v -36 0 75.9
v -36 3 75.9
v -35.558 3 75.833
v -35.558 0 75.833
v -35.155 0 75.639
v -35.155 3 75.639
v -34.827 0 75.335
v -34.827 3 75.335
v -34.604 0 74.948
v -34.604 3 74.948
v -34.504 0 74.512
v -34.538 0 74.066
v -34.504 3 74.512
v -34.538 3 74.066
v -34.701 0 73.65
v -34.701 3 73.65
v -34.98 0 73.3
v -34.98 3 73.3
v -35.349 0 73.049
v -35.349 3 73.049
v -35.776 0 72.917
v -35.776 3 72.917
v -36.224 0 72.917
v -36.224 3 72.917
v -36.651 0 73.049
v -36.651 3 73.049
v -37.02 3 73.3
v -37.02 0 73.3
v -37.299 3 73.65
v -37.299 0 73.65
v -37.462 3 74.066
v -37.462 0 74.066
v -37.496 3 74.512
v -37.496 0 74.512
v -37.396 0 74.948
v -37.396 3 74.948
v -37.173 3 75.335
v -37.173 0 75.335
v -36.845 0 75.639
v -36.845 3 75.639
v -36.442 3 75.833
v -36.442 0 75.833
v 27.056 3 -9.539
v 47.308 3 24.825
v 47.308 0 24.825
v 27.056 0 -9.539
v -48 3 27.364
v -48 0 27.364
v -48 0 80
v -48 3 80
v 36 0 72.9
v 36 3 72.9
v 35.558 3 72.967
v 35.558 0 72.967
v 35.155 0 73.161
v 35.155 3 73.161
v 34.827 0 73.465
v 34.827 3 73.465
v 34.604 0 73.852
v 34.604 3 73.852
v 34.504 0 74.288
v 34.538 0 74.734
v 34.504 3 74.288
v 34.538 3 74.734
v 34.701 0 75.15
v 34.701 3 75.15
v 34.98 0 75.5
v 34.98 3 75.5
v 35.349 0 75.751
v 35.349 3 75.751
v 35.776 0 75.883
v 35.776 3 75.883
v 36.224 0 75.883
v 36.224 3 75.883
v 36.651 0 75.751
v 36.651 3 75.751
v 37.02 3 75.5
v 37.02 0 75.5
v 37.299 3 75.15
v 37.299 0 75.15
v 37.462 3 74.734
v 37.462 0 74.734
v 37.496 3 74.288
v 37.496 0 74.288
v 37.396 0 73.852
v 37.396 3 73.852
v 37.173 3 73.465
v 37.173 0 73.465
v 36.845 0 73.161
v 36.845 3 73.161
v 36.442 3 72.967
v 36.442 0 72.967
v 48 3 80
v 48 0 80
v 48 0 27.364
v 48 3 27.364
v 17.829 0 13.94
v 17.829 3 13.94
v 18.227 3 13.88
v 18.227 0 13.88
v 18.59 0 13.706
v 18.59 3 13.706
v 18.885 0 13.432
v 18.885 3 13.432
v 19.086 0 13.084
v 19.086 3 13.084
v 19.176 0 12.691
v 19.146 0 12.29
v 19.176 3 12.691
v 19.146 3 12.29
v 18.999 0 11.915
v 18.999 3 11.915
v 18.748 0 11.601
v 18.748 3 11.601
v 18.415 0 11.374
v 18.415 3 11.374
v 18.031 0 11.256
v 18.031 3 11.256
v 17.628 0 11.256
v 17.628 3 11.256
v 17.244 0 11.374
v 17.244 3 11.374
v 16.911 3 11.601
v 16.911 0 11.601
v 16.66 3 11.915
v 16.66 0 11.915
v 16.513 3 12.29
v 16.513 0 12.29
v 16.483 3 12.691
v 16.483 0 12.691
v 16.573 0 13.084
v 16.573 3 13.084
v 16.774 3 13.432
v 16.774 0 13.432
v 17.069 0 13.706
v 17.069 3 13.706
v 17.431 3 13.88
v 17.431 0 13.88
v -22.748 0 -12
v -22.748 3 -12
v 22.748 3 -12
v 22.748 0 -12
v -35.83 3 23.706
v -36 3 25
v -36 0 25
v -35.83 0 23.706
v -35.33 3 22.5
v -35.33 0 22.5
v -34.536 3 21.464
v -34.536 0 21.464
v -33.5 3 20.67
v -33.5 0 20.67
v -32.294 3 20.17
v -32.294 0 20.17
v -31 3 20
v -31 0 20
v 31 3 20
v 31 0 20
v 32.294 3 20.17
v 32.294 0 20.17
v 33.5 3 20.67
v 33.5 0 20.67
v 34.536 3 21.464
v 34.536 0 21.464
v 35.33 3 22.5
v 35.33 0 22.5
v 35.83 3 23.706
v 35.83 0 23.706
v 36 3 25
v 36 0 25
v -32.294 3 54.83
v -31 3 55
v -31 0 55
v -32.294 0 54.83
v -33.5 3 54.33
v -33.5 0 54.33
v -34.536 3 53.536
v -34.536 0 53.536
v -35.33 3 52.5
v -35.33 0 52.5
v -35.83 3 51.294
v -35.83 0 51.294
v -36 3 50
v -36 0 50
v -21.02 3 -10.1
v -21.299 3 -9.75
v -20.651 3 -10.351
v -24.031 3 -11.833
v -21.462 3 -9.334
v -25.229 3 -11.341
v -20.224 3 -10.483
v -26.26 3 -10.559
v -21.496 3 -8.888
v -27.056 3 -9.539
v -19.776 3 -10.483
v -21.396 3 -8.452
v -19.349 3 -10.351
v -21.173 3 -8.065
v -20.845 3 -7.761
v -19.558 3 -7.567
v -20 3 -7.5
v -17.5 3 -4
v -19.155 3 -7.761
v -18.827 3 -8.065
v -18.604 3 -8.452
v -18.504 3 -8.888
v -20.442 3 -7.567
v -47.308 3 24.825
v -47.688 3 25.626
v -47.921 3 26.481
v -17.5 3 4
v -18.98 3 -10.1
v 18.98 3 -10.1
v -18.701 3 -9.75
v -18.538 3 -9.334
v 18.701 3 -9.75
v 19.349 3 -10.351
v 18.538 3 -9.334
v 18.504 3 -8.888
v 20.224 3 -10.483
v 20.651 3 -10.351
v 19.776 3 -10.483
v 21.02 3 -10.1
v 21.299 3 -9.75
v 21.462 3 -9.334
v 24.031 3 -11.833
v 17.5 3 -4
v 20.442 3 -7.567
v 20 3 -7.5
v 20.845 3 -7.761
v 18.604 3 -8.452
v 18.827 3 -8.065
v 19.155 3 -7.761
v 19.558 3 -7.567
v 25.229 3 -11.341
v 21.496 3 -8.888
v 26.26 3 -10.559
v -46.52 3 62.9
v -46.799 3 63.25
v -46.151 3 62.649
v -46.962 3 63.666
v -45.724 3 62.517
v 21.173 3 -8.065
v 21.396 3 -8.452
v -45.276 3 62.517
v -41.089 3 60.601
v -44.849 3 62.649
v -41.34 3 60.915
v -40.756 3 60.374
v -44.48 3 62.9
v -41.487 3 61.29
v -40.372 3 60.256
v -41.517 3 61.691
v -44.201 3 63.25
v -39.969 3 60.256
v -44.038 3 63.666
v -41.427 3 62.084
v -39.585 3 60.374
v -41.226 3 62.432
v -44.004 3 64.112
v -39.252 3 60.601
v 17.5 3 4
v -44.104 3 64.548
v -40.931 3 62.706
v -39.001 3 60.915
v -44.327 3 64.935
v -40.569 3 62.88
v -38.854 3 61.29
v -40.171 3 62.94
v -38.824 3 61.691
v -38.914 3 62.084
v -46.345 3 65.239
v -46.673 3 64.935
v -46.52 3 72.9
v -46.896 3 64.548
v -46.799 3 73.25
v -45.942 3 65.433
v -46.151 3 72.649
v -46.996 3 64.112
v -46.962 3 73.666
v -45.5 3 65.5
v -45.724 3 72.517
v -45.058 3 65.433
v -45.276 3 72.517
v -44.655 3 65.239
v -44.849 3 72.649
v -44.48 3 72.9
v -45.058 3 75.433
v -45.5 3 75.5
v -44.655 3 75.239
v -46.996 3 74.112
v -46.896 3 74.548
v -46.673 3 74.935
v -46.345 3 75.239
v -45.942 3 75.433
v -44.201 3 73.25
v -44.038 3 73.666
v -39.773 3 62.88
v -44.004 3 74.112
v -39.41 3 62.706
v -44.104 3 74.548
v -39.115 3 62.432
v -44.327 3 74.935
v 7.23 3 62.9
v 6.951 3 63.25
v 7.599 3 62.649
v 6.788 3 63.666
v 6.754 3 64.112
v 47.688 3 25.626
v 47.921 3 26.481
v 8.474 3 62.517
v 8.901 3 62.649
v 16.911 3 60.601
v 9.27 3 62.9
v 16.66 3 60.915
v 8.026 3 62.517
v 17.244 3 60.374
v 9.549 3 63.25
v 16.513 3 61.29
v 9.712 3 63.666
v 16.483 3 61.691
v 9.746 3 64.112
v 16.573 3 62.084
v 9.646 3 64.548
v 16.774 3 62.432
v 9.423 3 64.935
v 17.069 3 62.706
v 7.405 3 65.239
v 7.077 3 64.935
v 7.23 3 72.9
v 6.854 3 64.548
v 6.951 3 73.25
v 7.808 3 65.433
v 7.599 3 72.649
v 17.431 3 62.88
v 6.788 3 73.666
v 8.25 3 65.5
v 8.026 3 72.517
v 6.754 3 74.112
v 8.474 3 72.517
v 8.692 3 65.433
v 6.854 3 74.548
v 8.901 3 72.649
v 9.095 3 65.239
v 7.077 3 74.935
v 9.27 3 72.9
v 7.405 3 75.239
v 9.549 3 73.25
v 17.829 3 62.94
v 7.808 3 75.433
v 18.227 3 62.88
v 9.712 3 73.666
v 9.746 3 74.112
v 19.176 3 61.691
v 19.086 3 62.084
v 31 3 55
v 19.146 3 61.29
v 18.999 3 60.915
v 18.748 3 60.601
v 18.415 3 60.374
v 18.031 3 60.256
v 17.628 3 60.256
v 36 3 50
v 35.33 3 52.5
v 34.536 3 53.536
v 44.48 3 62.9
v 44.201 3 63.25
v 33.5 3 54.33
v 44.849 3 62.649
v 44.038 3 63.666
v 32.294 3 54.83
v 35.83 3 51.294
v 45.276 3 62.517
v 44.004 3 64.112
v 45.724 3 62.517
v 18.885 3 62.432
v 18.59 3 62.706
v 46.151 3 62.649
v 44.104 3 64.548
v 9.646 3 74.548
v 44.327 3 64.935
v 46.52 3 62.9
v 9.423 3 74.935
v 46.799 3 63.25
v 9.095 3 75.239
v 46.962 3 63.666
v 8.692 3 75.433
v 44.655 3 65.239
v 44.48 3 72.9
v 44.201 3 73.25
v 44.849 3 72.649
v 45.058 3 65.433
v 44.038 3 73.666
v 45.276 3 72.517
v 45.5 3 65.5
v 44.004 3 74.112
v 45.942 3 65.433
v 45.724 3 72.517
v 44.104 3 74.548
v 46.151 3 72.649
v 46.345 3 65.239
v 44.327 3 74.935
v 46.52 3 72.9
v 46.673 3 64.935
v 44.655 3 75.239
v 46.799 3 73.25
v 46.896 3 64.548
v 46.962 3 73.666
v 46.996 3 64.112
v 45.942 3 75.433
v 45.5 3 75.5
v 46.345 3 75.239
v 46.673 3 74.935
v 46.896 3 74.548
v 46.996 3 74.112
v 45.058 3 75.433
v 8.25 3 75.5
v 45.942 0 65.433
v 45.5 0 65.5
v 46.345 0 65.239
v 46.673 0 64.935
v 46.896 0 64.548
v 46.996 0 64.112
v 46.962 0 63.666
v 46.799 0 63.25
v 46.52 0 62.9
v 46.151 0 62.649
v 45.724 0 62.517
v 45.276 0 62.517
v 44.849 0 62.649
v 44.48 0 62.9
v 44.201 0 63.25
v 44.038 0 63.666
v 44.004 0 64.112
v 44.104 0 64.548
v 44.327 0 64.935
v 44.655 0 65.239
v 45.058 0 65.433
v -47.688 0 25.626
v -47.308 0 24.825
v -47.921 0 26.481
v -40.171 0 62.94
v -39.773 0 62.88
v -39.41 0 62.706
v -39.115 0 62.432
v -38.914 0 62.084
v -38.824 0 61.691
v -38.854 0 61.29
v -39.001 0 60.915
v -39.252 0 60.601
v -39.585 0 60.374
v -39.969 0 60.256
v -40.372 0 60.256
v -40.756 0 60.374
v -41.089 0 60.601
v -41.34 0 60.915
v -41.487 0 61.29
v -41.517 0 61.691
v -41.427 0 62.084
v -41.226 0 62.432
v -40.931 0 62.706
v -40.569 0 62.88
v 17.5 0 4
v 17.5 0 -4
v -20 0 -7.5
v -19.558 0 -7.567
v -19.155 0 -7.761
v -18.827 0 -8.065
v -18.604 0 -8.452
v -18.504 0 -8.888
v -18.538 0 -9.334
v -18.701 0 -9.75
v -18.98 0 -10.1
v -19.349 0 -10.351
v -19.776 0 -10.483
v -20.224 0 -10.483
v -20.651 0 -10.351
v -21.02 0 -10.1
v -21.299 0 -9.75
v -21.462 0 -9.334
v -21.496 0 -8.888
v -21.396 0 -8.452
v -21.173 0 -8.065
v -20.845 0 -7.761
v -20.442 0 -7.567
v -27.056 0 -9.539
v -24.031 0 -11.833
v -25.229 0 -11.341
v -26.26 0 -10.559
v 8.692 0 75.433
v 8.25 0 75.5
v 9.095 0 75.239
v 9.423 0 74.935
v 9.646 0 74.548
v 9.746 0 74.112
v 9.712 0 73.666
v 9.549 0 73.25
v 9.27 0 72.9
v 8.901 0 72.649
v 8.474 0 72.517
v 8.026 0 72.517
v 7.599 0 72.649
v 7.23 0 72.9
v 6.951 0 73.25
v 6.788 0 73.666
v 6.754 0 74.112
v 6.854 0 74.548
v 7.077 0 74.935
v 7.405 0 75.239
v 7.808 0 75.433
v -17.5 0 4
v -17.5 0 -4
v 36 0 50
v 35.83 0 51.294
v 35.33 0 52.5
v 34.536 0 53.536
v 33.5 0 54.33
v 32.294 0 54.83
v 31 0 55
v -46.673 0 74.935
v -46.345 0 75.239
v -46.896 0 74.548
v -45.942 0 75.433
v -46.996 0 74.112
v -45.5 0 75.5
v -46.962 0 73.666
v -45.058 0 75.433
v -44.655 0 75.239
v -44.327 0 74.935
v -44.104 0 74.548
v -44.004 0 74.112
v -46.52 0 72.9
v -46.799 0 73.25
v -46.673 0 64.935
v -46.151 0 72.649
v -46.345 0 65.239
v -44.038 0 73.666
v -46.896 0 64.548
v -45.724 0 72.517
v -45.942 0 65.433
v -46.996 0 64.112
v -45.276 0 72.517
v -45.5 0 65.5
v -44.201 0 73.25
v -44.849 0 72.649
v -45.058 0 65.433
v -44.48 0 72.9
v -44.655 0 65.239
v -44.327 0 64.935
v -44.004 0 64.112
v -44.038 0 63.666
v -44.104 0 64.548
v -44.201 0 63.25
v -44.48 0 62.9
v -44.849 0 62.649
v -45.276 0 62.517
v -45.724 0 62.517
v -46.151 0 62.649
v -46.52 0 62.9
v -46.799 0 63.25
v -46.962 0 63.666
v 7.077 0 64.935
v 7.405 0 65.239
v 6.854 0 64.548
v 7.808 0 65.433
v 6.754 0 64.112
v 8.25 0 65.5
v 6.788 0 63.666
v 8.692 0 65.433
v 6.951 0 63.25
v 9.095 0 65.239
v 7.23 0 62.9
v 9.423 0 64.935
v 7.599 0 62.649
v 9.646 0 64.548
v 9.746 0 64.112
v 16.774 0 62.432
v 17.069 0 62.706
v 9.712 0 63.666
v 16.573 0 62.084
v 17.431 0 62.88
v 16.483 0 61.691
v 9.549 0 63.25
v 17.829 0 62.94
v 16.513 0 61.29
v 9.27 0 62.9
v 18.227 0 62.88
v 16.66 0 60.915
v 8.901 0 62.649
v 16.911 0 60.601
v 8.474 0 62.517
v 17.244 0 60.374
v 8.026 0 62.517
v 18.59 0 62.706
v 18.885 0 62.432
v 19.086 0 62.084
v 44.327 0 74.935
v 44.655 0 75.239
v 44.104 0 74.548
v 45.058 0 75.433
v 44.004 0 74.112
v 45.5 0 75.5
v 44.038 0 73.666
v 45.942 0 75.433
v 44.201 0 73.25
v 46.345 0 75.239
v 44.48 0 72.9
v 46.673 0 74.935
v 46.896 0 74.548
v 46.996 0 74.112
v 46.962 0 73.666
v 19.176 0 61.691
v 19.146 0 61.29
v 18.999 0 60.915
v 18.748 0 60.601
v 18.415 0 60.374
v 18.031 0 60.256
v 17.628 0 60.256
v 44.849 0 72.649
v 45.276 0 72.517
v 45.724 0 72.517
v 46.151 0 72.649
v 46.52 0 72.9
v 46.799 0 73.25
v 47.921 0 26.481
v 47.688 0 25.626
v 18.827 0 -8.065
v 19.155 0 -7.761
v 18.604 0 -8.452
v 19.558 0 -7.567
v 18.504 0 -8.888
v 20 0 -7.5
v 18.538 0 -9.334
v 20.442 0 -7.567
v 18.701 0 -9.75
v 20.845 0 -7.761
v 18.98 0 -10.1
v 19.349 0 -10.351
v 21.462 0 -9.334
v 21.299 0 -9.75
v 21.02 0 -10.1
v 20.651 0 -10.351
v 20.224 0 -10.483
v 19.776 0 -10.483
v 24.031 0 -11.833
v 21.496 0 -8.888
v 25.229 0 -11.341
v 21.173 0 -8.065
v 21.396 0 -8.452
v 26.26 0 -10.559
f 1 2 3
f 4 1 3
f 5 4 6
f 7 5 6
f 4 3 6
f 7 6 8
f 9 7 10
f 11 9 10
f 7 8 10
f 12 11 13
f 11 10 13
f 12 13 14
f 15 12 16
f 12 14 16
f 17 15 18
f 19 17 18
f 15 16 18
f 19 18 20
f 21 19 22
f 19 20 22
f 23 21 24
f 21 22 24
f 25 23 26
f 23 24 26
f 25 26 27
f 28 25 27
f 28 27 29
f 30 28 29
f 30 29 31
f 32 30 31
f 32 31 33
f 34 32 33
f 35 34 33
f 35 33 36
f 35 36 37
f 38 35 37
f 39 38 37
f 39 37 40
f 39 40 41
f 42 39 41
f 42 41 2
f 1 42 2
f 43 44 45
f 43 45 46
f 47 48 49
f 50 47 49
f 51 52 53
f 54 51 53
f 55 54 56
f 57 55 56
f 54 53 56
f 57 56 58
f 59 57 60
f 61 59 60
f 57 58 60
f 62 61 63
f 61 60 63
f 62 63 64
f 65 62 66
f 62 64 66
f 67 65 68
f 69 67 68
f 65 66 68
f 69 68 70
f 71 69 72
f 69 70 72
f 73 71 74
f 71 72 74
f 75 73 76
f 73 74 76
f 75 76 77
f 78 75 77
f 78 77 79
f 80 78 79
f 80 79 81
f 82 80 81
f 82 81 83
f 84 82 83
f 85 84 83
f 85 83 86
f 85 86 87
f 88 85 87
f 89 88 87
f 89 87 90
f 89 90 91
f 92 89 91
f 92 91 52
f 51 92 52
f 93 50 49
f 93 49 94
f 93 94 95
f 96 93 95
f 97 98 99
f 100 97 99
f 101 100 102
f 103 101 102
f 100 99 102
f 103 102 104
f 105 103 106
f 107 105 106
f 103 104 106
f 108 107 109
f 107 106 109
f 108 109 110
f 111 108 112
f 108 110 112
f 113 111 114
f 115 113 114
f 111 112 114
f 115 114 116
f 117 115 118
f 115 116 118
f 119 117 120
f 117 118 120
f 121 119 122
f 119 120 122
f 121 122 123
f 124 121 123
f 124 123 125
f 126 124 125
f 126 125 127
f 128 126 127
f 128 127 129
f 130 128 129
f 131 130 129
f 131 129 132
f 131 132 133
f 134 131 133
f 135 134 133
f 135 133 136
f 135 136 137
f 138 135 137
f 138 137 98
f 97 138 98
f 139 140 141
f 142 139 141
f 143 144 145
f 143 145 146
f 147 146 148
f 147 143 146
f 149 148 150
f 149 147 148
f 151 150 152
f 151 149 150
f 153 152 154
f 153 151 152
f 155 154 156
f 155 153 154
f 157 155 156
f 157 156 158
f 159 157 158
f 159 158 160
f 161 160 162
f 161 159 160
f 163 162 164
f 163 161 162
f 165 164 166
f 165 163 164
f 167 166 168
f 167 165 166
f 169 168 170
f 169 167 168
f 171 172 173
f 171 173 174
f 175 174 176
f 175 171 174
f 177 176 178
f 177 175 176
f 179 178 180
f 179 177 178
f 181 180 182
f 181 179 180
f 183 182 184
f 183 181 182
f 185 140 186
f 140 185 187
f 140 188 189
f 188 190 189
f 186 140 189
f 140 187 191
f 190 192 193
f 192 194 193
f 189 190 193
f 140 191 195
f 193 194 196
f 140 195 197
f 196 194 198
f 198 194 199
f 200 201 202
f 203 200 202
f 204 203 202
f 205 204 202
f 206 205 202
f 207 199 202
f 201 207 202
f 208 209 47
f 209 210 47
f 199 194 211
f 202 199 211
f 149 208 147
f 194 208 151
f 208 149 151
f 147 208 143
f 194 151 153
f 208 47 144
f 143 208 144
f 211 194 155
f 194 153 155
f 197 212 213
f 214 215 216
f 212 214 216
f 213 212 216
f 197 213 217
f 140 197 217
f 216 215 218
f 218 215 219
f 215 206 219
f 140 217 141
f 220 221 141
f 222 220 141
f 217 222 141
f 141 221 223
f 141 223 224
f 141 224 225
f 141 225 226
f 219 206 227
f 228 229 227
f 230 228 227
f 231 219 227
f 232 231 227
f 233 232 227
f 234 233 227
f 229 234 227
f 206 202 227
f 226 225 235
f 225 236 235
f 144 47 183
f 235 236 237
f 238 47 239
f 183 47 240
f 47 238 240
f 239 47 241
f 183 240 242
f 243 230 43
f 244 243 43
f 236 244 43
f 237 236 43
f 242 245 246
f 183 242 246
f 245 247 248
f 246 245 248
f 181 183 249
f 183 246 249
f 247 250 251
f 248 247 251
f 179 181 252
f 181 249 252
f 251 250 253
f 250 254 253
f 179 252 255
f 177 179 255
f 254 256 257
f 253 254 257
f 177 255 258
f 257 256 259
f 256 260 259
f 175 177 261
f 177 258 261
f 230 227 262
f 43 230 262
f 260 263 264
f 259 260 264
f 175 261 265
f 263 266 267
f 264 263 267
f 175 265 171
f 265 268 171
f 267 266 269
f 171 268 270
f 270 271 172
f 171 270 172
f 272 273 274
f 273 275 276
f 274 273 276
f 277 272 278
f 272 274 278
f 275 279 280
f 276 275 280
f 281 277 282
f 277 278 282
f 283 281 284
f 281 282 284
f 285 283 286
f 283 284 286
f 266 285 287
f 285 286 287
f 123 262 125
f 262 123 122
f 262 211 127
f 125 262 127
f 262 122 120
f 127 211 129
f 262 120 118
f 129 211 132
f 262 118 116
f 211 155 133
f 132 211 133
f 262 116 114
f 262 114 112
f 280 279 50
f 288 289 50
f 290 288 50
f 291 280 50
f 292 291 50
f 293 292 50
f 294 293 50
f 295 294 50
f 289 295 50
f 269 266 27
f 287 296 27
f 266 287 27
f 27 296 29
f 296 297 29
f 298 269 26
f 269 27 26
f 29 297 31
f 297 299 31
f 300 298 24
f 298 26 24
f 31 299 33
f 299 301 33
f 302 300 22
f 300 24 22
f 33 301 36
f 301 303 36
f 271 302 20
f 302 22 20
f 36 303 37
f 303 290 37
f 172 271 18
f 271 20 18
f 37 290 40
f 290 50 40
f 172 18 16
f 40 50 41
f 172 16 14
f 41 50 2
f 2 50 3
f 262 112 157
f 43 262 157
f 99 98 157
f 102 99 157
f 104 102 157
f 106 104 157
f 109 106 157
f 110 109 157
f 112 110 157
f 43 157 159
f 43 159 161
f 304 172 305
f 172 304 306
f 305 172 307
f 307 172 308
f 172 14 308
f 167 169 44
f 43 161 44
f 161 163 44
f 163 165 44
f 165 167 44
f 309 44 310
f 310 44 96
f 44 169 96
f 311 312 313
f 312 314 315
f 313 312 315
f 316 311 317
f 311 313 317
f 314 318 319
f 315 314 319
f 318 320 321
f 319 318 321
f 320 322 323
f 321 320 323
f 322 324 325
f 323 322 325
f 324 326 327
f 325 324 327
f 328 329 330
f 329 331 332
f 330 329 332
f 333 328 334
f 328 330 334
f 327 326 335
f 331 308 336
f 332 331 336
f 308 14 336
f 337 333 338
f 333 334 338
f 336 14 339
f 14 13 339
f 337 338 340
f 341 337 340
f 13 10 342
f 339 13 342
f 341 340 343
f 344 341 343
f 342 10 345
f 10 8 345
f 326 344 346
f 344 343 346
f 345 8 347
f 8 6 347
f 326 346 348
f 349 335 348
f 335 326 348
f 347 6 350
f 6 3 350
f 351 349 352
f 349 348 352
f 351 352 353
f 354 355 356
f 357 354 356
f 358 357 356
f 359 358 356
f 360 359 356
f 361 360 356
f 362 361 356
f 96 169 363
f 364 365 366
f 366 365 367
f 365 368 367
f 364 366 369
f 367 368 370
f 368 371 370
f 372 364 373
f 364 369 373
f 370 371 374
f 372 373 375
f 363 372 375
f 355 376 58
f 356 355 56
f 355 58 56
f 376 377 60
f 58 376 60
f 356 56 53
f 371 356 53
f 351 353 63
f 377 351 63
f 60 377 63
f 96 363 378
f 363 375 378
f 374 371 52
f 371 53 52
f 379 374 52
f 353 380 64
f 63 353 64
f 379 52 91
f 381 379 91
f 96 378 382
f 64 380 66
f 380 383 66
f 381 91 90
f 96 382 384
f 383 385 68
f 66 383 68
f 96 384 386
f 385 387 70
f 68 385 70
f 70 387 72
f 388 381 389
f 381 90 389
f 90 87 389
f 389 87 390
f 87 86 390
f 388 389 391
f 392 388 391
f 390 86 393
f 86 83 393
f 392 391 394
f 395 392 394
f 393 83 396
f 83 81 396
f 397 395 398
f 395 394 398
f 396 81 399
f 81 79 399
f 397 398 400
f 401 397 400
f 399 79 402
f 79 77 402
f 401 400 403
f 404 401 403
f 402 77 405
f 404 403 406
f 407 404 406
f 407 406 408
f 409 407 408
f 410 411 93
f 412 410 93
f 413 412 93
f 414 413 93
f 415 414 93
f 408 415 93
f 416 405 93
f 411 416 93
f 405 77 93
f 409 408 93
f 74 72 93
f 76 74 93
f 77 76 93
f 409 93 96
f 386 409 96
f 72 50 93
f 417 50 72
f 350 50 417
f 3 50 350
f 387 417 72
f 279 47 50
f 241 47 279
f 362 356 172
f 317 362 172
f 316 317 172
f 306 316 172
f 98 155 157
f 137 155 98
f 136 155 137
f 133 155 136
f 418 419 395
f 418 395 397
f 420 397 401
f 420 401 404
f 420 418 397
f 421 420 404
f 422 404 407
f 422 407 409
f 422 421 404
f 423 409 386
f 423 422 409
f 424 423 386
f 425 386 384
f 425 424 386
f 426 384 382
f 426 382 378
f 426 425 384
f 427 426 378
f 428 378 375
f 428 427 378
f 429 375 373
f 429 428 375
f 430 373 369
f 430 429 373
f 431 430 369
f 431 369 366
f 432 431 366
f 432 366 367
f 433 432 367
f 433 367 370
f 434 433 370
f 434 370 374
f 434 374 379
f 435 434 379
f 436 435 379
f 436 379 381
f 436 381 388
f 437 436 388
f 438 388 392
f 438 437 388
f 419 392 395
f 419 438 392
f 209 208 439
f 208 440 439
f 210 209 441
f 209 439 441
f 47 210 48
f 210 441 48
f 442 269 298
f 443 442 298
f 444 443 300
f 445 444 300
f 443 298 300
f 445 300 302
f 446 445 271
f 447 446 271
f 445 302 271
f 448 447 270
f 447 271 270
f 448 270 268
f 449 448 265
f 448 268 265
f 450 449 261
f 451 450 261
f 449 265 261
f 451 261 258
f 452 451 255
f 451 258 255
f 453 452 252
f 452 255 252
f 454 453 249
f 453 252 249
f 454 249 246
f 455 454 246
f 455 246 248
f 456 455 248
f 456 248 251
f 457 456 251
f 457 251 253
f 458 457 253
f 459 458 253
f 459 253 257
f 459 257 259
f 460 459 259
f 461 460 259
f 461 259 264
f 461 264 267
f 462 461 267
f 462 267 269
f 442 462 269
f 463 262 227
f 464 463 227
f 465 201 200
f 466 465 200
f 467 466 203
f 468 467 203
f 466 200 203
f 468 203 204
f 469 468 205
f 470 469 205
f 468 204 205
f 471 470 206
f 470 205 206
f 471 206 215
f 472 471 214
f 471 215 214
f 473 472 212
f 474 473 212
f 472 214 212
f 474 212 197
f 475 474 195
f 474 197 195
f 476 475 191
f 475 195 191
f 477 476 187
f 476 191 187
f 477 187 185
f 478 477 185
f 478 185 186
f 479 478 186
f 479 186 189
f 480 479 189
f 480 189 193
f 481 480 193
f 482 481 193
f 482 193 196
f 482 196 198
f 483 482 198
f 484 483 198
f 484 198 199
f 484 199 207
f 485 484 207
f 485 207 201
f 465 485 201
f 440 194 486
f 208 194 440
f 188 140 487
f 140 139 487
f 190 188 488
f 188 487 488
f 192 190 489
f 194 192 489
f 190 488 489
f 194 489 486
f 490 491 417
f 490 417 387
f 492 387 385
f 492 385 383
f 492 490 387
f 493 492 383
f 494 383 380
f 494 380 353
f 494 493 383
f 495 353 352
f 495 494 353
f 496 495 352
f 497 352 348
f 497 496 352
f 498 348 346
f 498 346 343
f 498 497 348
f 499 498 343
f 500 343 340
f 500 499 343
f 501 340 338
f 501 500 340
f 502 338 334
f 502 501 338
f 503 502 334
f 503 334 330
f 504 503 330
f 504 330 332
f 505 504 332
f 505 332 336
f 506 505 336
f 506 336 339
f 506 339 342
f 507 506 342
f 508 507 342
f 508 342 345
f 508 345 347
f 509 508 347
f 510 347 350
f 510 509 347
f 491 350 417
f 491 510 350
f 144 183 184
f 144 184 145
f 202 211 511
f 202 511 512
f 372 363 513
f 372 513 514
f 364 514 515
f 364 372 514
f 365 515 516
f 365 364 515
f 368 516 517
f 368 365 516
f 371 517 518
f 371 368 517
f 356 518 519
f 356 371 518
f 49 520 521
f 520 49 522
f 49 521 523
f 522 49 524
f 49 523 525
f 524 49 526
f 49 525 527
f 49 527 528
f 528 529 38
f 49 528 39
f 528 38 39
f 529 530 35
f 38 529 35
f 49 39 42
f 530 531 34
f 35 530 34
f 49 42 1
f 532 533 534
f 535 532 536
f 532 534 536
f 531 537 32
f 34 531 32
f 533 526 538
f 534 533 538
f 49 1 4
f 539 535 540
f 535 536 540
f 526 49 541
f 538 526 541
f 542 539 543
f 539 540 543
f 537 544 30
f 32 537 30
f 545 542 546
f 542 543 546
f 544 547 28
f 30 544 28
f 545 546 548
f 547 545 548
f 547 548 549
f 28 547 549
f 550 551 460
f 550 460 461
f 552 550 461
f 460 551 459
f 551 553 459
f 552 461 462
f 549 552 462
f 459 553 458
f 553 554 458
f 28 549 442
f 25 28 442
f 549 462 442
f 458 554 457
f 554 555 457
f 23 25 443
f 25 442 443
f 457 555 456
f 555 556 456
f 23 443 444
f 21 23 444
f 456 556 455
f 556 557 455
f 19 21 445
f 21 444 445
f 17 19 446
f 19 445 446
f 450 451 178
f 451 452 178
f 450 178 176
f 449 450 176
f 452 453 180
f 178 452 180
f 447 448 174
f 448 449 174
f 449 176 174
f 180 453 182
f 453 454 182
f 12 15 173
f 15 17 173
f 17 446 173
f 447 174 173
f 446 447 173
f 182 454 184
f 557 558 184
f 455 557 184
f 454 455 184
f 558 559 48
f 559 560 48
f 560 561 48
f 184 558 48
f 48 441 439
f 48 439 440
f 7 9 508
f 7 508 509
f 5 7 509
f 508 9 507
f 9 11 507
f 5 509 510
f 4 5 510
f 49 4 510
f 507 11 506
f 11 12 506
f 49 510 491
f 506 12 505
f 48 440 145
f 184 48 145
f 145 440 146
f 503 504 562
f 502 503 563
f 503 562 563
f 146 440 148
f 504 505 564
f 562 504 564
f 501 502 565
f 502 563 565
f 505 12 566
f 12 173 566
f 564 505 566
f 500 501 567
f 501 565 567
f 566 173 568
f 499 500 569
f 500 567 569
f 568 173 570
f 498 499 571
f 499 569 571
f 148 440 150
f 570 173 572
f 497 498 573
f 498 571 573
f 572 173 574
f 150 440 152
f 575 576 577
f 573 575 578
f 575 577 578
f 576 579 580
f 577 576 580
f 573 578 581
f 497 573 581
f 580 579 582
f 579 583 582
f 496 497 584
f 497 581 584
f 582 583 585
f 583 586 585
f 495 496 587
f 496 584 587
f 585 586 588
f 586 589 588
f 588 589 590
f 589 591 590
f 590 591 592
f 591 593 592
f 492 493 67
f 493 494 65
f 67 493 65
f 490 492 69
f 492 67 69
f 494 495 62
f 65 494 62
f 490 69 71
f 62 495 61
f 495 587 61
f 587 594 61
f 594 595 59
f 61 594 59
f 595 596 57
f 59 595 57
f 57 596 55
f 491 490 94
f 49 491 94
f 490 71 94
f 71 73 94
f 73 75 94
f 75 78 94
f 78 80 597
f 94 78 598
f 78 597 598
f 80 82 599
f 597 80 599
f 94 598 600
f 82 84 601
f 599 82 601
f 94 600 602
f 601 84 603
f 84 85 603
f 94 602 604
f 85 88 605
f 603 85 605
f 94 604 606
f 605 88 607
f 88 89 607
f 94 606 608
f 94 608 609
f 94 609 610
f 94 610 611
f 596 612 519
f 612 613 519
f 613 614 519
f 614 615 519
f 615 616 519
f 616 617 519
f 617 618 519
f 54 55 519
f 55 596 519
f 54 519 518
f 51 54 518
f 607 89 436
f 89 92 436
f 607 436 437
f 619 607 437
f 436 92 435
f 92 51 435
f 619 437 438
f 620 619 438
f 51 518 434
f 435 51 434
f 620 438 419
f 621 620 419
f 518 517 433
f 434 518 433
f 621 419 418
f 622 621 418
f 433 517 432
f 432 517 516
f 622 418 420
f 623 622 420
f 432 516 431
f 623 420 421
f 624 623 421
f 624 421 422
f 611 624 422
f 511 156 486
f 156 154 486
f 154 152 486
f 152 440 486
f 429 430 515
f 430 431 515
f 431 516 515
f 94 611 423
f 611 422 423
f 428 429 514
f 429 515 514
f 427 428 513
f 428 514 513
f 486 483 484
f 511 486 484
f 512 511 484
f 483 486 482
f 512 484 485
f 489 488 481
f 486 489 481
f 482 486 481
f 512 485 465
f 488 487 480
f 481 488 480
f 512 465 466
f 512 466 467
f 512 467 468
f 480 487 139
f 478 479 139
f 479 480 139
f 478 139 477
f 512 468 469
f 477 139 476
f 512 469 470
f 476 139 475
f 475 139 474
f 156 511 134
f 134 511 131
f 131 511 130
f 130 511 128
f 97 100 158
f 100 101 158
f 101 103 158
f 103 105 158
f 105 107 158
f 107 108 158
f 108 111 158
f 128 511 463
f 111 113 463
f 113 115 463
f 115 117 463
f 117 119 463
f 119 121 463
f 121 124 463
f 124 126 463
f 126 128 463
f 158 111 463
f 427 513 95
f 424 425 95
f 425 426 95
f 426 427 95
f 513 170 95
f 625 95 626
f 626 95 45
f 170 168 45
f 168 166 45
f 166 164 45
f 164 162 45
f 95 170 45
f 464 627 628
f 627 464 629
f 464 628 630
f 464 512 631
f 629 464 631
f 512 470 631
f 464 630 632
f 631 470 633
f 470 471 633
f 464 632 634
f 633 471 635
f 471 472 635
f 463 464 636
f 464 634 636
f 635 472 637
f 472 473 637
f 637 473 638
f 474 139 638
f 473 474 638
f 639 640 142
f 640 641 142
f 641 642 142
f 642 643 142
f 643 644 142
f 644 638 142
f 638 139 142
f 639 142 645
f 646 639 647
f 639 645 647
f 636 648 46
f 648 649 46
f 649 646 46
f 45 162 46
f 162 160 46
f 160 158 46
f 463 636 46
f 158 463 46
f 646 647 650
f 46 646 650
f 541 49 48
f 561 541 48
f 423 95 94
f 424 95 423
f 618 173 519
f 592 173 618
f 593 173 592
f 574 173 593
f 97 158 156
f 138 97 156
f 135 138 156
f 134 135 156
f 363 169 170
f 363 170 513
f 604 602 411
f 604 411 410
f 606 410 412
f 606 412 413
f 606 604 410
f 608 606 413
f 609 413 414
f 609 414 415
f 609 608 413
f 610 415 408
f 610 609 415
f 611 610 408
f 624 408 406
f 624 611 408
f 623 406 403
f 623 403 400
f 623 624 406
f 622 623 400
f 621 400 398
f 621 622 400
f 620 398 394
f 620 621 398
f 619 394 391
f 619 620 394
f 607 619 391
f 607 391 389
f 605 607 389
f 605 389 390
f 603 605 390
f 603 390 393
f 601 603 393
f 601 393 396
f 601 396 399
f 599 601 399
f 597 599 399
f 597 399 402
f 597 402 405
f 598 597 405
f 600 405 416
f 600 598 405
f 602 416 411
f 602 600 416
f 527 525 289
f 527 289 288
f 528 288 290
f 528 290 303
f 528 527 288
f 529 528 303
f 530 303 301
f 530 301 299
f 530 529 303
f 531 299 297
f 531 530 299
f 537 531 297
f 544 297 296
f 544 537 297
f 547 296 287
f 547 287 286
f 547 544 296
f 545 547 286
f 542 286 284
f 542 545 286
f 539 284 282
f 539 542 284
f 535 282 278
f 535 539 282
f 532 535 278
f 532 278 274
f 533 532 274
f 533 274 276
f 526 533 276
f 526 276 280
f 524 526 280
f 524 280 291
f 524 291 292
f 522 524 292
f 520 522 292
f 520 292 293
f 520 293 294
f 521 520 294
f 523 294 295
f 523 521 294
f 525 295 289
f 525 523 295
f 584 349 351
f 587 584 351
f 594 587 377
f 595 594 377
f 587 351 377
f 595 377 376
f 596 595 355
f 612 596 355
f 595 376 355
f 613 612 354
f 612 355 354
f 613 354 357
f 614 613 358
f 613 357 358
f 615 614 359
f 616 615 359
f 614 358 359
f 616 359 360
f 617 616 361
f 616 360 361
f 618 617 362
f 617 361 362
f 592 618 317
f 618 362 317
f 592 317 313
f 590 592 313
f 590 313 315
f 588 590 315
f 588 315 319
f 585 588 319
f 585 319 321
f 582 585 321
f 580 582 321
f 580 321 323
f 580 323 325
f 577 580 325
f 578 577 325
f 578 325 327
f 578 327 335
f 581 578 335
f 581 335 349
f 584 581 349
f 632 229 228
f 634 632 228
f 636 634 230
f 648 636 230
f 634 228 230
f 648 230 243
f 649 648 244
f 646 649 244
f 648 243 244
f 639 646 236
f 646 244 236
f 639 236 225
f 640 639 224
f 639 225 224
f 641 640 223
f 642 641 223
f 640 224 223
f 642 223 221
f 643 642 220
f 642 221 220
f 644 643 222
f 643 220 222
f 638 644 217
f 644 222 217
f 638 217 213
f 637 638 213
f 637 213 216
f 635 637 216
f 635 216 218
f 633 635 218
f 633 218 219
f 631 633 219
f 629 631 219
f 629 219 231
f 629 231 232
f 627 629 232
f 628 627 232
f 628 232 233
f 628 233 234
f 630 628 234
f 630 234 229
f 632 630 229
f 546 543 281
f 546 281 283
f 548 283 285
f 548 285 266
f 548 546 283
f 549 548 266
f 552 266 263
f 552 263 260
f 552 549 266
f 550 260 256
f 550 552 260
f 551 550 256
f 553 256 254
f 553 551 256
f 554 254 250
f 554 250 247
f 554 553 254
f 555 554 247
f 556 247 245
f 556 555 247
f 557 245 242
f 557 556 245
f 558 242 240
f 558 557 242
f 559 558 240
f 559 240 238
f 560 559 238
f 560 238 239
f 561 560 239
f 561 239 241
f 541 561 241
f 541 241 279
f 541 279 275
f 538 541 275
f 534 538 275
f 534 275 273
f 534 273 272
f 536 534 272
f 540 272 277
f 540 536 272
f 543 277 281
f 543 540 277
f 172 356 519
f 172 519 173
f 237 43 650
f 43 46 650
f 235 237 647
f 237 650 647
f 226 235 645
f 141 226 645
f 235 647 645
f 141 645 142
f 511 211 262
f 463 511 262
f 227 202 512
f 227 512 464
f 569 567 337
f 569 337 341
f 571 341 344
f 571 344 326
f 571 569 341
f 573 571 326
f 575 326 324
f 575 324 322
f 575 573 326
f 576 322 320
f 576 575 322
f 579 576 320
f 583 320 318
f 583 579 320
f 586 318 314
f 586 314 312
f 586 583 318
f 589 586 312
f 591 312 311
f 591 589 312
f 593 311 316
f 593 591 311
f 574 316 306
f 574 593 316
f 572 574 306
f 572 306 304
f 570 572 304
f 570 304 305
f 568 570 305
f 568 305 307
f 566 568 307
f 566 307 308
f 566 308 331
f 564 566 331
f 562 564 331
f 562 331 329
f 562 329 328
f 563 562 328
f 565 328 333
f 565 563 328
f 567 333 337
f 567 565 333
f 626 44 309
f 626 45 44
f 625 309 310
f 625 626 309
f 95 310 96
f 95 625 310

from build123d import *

# Parameters (mm, degrees)
SKETCH1_R           = 1.5
SKETCH1_R_2         = 1.65
SKETCH1_W           = 6
SKETCH1_H           = 28
BOSS_EXTRUDE1_DEPTH = 3
CUT_EXTRUDE2_REACH  = 109.373
SKETCH3_R           = 1.5
CUT_EXTRUDE3_REACH  = 109.373
SKETCH4_W           = 22.395
SKETCH4_H           = 68
SKETCH6_W           = 51.21
SKETCH6_H           = 5
BOSS_EXTRUDE2_DEPTH = 3
CUT_EXTRUDE4_REACH  = 109.373
SKETCH7_R           = 1.5
CUT_EXTRUDE5_REACH  = 109.373
SKETCH9_R           = 1.5
CUT_EXTRUDE6_REACH  = 109.373
SKETCH11_R          = 1.5
SKETCH11_R_2        = 2.5
BOSS_EXTRUDE3_DEPTH = 3
CUT_EXTRUDE7_REACH  = 109.373
CUT_EXTRUDE8_START  = -3
SKETCH13_W          = 4.95
SKETCH13_H          = 15
SKETCH13_W_2        = 6.078763038
SKETCH13_H_2        = 4.767996375
CUT_EXTRUDE8_DEPTH  = 3
BOSS_EXTRUDE4_DEPTH = 3
CUT_EXTRUDE9_REACH  = 120.849
SKETCH15_R          = 1.5
CUT_EXTRUDE10_DEPTH = 119.84864324
SKETCH19_W          = 9
SKETCH19_H          = 48.6
SKETCH19_W_2        = 31.468413904
SKETCH19_H_2        = 28.051944454
BOSS_EXTRUDE5_DEPTH = 3
SKETCH20_W          = 96
SKETCH20_H          = 16
CUT_EXTRUDE11_DEPTH = 108.373181009
SKETCH22_W          = 4.143615352
SKETCH22_H          = 3.607002568
BOSS_EXTRUDE6_DEPTH = 3
FILLET1_R           = 5
SKETCH23_R          = 1.35
CUT_EXTRUDE12_DEPTH = 94.343451832
CUT_EXTRUDE13_DEPTH = 94.343451832
SKETCH28_W          = 35
SKETCH28_H          = 8
CUT_EXTRUDE17_DEPTH = 94.343451832
SKETCH29_R          = 1.5
CUT_EXTRUDE18_DEPTH = 94.343451832


with BuildPart() as part:
    # Sketch1 → Boss-Extrude1 (new body)
    with BuildSketch(Plane(origin=(0, 0, 0), x_dir=(1, 0, 0), z_dir=(0, 1, 0))):
        Polygon((-48, -80), (-48, 80), (48, 80), (48, -80), (48, -96), (-48, -96), align=None)
        with Locations(Location((45.5, -74, 0), (0, 0, 270))):
            Circle(SKETCH1_R, mode=Mode.SUBTRACT)
        with Locations(Location((45.5, -64, 0), (0, 0, 270))):
            Circle(SKETCH1_R, mode=Mode.SUBTRACT)
        with Locations(Location((-45.5, -64, 0), (0, 0, 270))):
            Circle(SKETCH1_R, mode=Mode.SUBTRACT)
        with Locations(Location((-45.5, -74, 0), (0, 0, 270))):
            Circle(SKETCH1_R, mode=Mode.SUBTRACT)
        with Locations(Location((8.25, -74, 0), (0, 0, 270))):
            Circle(SKETCH1_R, mode=Mode.SUBTRACT)
        with Locations(Location((8.25, -64, 0), (0, 0, 270))):
            Circle(SKETCH1_R, mode=Mode.SUBTRACT)
        with Locations(Location((0.259511597, -37.46931278, 0), (0, 0, 270))):
            Circle(SKETCH1_R_2, mode=Mode.SUBTRACT)
        with Locations(Location((15.320886036, -37.46931278, 0), (0, 0, 270))):
            Circle(SKETCH1_R_2, mode=Mode.SUBTRACT)
        with Locations(Location((15.320886036, -52.53068722, 0), (0, 0, 270))):
            Circle(SKETCH1_R_2, mode=Mode.SUBTRACT)
        with Locations(Location((0.259511597, -52.53068722, 0), (0, 0, 270))):
            Circle(SKETCH1_R_2, mode=Mode.SUBTRACT)
        with Locations(Location((17.55, -90, 0), (0, 0, 270))):
            Circle(SKETCH1_R, mode=Mode.SUBTRACT)
        with Locations(Location((45.55, -90, 0), (0, 0, 270))):
            Circle(SKETCH1_R, mode=Mode.SUBTRACT)
        with Locations(Location((-45.55, -90, 0), (0, 0, 90))):
            Circle(SKETCH1_R, mode=Mode.SUBTRACT)
        with Locations(Location((-17.55, -90, 0), (0, 0, 90))):
            Circle(SKETCH1_R, mode=Mode.SUBTRACT)
        with Locations((22.5, -45.4)):
            Rectangle(SKETCH1_W, SKETCH1_H, mode=Mode.SUBTRACT)
        Polygon((43, -80), (34.5, -80), (34.5, -31.4), (43, -31.4), (43.5, -31.4), (43.5, -58), (43, -58), align=None, mode=Mode.SUBTRACT)
    extrude(amount=BOSS_EXTRUDE1_DEPTH)

    # Sketch3 → Cut-Extrude2 (cut, up to next)
    with BuildSketch(Plane(origin=(0, 3, 0), x_dir=(1, 0, 0), z_dir=(0, 1, 0)), mode=Mode.PRIVATE) as cut_extrude2_sk1:
        with Locations(Location((0, 9, 0), (0, 0, 270))):
            Circle(SKETCH3_R)
    cut_extrude2_tool1 = extrude(cut_extrude2_sk1.sketch, amount=-CUT_EXTRUDE2_REACH, mode=Mode.PRIVATE) & part.part
    add(cut_extrude2_tool1.solids().sort_by_distance((0, 3, -9))[0], mode=Mode.SUBTRACT)

    # Sketch4 → Cut-Extrude3 (cut, up to next)
    with BuildSketch(Plane(origin=(0, 3, 0), x_dir=(1, 0, 0), z_dir=(0, 1, 0)), mode=Mode.PRIVATE) as cut_extrude3_sk1:
        with Locations((36.8025, 46)):
            Rectangle(SKETCH4_W, SKETCH4_H)
    cut_extrude3_tool1 = extrude(cut_extrude3_sk1.sketch, amount=-CUT_EXTRUDE3_REACH, mode=Mode.PRIVATE) & part.part
    # Sketch4 → Cut-Extrude3 (cut, up to next)
    with BuildSketch(Plane(origin=(0, 3, 0), x_dir=(1, 0, 0), z_dir=(0, 1, 0)), mode=Mode.PRIVATE) as cut_extrude3_sk2:
        with Locations((-36.8025, 46)):
            Rectangle(SKETCH4_W, SKETCH4_H)
    cut_extrude3_tool2 = extrude(cut_extrude3_sk2.sketch, amount=-CUT_EXTRUDE3_REACH, mode=Mode.PRIVATE) & part.part
    add(cut_extrude3_tool1.solids().sort_by_distance((36.8025, 3, -46))[0], mode=Mode.SUBTRACT)
    add(cut_extrude3_tool2.solids().sort_by_distance((-36.8025, 3, -46))[0], mode=Mode.SUBTRACT)

    # Sketch6 → Boss-Extrude2 (add)
    with BuildSketch(Plane(origin=(0, 3, 0), x_dir=(1, 0, 0), z_dir=(0, 1, 0))):
        with Locations((0, 82.5)):
            Rectangle(SKETCH6_W, SKETCH6_H)
    extrude(amount=-BOSS_EXTRUDE2_DEPTH)

    # Sketch7 → Cut-Extrude4 (cut, up to next)
    with BuildSketch(Plane(origin=(0, 3, 0), x_dir=(1, 0, 0), z_dir=(0, 1, 0)), mode=Mode.PRIVATE) as cut_extrude4_sk1:
        with Locations(Location((-17.8495, 79.268380868, 0), (0, 0, 270))):
            Circle(SKETCH7_R)
    cut_extrude4_tool1 = extrude(cut_extrude4_sk1.sketch, amount=-CUT_EXTRUDE4_REACH, mode=Mode.PRIVATE) & part.part
    # Sketch7 → Cut-Extrude4 (cut, up to next)
    with BuildSketch(Plane(origin=(0, 3, 0), x_dir=(1, 0, 0), z_dir=(0, 1, 0)), mode=Mode.PRIVATE) as cut_extrude4_sk2:
        with Locations(Location((17.8495, 79.268380868, 0), (0, 0, 270))):
            Circle(SKETCH7_R)
    cut_extrude4_tool2 = extrude(cut_extrude4_sk2.sketch, amount=-CUT_EXTRUDE4_REACH, mode=Mode.PRIVATE) & part.part
    add(cut_extrude4_tool1.solids().sort_by_distance((-17.8495, 3, -79.268381))[0], mode=Mode.SUBTRACT)
    add(cut_extrude4_tool2.solids().sort_by_distance((17.8495, 3, -79.268381))[0], mode=Mode.SUBTRACT)

    # Sketch9 → Cut-Extrude5 (cut, up to next)
    with BuildSketch(Plane(origin=(0, 3, 0), x_dir=(1, 0, 0), z_dir=(0, 1, 0)), mode=Mode.PRIVATE) as cut_extrude5_sk1:
        with Locations(Location((-22.6907969, 44, 0), (0, 0, 270))):
            Circle(SKETCH9_R)
    cut_extrude5_tool1 = extrude(cut_extrude5_sk1.sketch, amount=-CUT_EXTRUDE5_REACH, mode=Mode.PRIVATE) & part.part
    # Sketch9 → Cut-Extrude5 (cut, up to next)
    with BuildSketch(Plane(origin=(0, 3, 0), x_dir=(1, 0, 0), z_dir=(0, 1, 0)), mode=Mode.PRIVATE) as cut_extrude5_sk2:
        with Locations(Location((22.6907969, 44, 0), (0, 0, 270))):
            Circle(SKETCH9_R)
    cut_extrude5_tool2 = extrude(cut_extrude5_sk2.sketch, amount=-CUT_EXTRUDE5_REACH, mode=Mode.PRIVATE) & part.part
    add(cut_extrude5_tool1.solids().sort_by_distance((-22.690797, 3, -44))[0], mode=Mode.SUBTRACT)
    add(cut_extrude5_tool2.solids().sort_by_distance((22.690797, 3, -44))[0], mode=Mode.SUBTRACT)

    # Sketch10 → Cut-Extrude6 (cut, up to next)
    with BuildSketch(Plane(origin=(0, 3, 0), x_dir=(1, 0, 0), z_dir=(0, 1, 0)), mode=Mode.PRIVATE) as cut_extrude6_sk1:
        Polygon((48, -26), (25.605, 12), (48, 12), align=None)
    cut_extrude6_tool1 = extrude(cut_extrude6_sk1.sketch, amount=-CUT_EXTRUDE6_REACH, mode=Mode.PRIVATE) & part.part
    # Sketch10 → Cut-Extrude6 (cut, up to next)
    with BuildSketch(Plane(origin=(0, 3, 0), x_dir=(1, 0, 0), z_dir=(0, 1, 0)), mode=Mode.PRIVATE) as cut_extrude6_sk2:
        Polygon((-48, -26), (-48, 12), (-25.605, 12), align=None)
    cut_extrude6_tool2 = extrude(cut_extrude6_sk2.sketch, amount=-CUT_EXTRUDE6_REACH, mode=Mode.PRIVATE) & part.part
    add(cut_extrude6_tool1.solids().sort_by_distance((40.535, 3, 0.666667))[0], mode=Mode.SUBTRACT)
    add(cut_extrude6_tool2.solids().sort_by_distance((-40.535, 3, 0.666667))[0], mode=Mode.SUBTRACT)

    # Sketch11 → Boss-Extrude3 (add)
    # profile 1 of 2: a face of its own
    with BuildSketch(Plane.XZ):
        with BuildLine():
            Line((-45.873798612, -40.351535952), (-25.605, -52.641311078))
            Line((-25.605, -52.641311078), (-25.605, -35.641311078))
            Line((-25.605, -35.641311078), (-31.796655586, -35.641311078))
            Line((-31.796655586, -35.641311078), (-42.885371512, -33.037114659))
            ThreePointArc((-42.885371512, -33.037114659), (-47.502761912, -35.418300045), (-45.873798612, -40.351535952))
        make_face()
        with Locations(Location((-32.930328676, -41.931167665, 0), (0, 0, 270))):
            Circle(SKETCH11_R, mode=Mode.SUBTRACT)
        with Locations(Location((-43.799893893, -36.931167665, 0), (0, 0, 270))):
            Circle(SKETCH11_R_2, mode=Mode.SUBTRACT)
    # profile 2 of 2: a face of its own
    with BuildSketch(Plane.XZ):
        with BuildLine():
            Line((25.605, -35.641311078), (25.605, -52.641311078))
            Line((25.605, -52.641311078), (45.873798612, -40.351535952))
            ThreePointArc((45.873798612, -40.351535952), (47.502761912, -35.418300045), (42.885371512, -33.037114659))
            Line((42.885371512, -33.037114659), (31.796655586, -35.641311078))
            Line((31.796655586, -35.641311078), (25.605, -35.641311078))
        make_face()
        with Locations(Location((32.930328676, -41.931167665, 0), (0, 0, 270))):
            Circle(SKETCH11_R, mode=Mode.SUBTRACT)
        with Locations(Location((43.799893893, -36.931167665, 0), (0, 0, 270))):
            Circle(SKETCH11_R_2, mode=Mode.SUBTRACT)
    extrude(amount=-BOSS_EXTRUDE3_DEPTH)

    # Sketch12 → Cut-Extrude7 (cut, up to next)
    with BuildSketch(Plane.XZ, mode=Mode.PRIVATE) as cut_extrude7_sk1:
        Polygon((-11.899893893, -39.441311078), (-11.899893893, -54.741311078), (12.200106107, -54.741311078), (12.200106107, -39.441311078), (17.036431901, -39.441311078), (17.164018107, -32.041311078), (12.200106107, -32.041311078), (12.200106107, -31.191311078), (12.200106107, -25.191311078), (12.200106107, -19.091311078), (-3.799893893, -19.091311078), (-3.799893893, -30.391311078), (-11.899893893, -30.391311078), (-11.899893893, -32.041311078), (-16.849893893, -32.041311078), (-16.849893893, -39.441311078), align=None)
    cut_extrude7_tool1 = extrude(cut_extrude7_sk1.sketch, amount=-CUT_EXTRUDE7_REACH, mode=Mode.PRIVATE) & part.part
    add(cut_extrude7_tool1.solids().sort_by_distance((1.013826, 0, -38.139532))[0], mode=Mode.SUBTRACT)

    # Sketch13 → Cut-Extrude8 (cut)
    with BuildSketch(Plane.XZ.offset(CUT_EXTRUDE8_START)):
        with Locations((-14.374893893, -36.541311078)):
            Rectangle(SKETCH13_W, SKETCH13_H)
        with Locations((14.675106107, -36.541311078)):
            Rectangle(SKETCH13_W, SKETCH13_H)
        with Locations((15.239487626, -48.991959171)):
            Rectangle(SKETCH13_W_2, SKETCH13_H_2)
    extrude(amount=CUT_EXTRUDE8_DEPTH, mode=Mode.SUBTRACT)

    # Sketch14 → Boss-Extrude4 (add)
    with BuildSketch(Plane.XZ):
        with BuildLine():
            Line((-62, -85), (-25.605, -85))
            Line((-25.605, -85), (-25.605, -72))
            Line((-25.605, -72), (-70, -72))
            Line((-70, -72), (-70, -77))
            ThreePointArc((-70, -77), (-67.656854249, -82.656854249), (-62, -85))
        make_face()
        with BuildLine():
            Line((25.605, -72), (25.605, -85))
            Line((25.605, -85), (62, -85))
            ThreePointArc((62, -85), (67.656854249, -82.656854249), (70, -77))
            Line((70, -77), (70, -72))
            Line((70, -72), (25.605, -72))
        make_face()
    extrude(amount=-BOSS_EXTRUDE4_DEPTH)

    # Sketch15 → Cut-Extrude9 (cut, up to next)
    with BuildSketch(Plane(origin=(0, 3, 0), x_dir=(1, 0, 0), z_dir=(0, 1, 0)), mode=Mode.PRIVATE) as cut_extrude9_sk1:
        with Locations(Location((-20, 9, 0), (0, 0, 270))):
            Circle(SKETCH15_R)
    cut_extrude9_tool1 = extrude(cut_extrude9_sk1.sketch, amount=-CUT_EXTRUDE9_REACH, mode=Mode.PRIVATE) & part.part
    # Sketch15 → Cut-Extrude9 (cut, up to next)
    with BuildSketch(Plane(origin=(0, 3, 0), x_dir=(1, 0, 0), z_dir=(0, 1, 0)), mode=Mode.PRIVATE) as cut_extrude9_sk2:
        with Locations(Location((20, 9, 0), (0, 0, 270))):
            Circle(SKETCH15_R)
    cut_extrude9_tool2 = extrude(cut_extrude9_sk2.sketch, amount=-CUT_EXTRUDE9_REACH, mode=Mode.PRIVATE) & part.part
    add(cut_extrude9_tool1.solids().sort_by_distance((-20, 3, -9))[0], mode=Mode.SUBTRACT)
    add(cut_extrude9_tool2.solids().sort_by_distance((20, 3, -9))[0], mode=Mode.SUBTRACT)

    # Sketch18 → Cut-Extrude10 (cut, through all)
    with BuildSketch(Plane(origin=(0, 3, 0), x_dir=(1, 0, 0), z_dir=(0, 1, 0))):
        Polygon((-87.931846418, 12), (-25.605, 12), (25.605, 12), (83.08251035, 12), (83.08251035, 92.113601242), (-87.931846418, 92.113601242), align=None)
    extrude(amount=-CUT_EXTRUDE10_DEPTH, mode=Mode.SUBTRACT)

    # Sketch19 → Boss-Extrude5 (add, through all)
    with BuildSketch(Plane(origin=(0, 3, 0), x_dir=(1, 0, 0), z_dir=(0, 1, 0))):
        with Locations((39, -55.7)):
            Rectangle(SKETCH19_W, SKETCH19_H)
        with Locations((9.765793048, -45.425972227)):
            Rectangle(SKETCH19_W_2, SKETCH19_H_2)
    extrude(amount=-BOSS_EXTRUDE5_DEPTH)

    # Sketch20 → Cut-Extrude11 (cut, through all)
    with BuildSketch(Plane(origin=(0, 3, 0), x_dir=(1, 0, 0), z_dir=(0, 1, 0))):
        with Locations((0, -88)):
            Rectangle(SKETCH20_W, SKETCH20_H)
    extrude(amount=-CUT_EXTRUDE11_DEPTH, mode=Mode.SUBTRACT)

    # Sketch22 → Boss-Extrude6 (add, through all)
    with BuildSketch(Plane(origin=(0, 3, 0), x_dir=(1, 0, 0), z_dir=(0, 1, 0))):
        with Locations((0, 9)):
            Rectangle(SKETCH22_W, SKETCH22_H)
    extrude(amount=-BOSS_EXTRUDE6_DEPTH)

    # Fillet1
    fillet1_edges = [part.edges().sort_by_distance(p)[0] for p in [
        (-25.605, 1.5, -12),
        (25.605, 1.5, -12),
        (48, 1.5, 26),
        (-48, 1.5, 26),
    ]]
    fillet(fillet1_edges, radius=FILLET1_R)

    # Sketch23 → Cut-Extrude12 (cut, through all)
    with BuildSketch(Plane(origin=(0, 3, 0), x_dir=(1, 0, 0), z_dir=(0, 1, 0))):
        with Locations(Location((-40.170591439, -61.590425785, 0), (0, 0, 270))):
            Circle(SKETCH23_R)
        with Locations(Location((17.829408561, -61.590425785, 0), (0, 0, 270))):
            Circle(SKETCH23_R)
        with Locations(Location((17.829408561, -12.590425785, 0), (0, 0, 270))):
            Circle(SKETCH23_R)
    extrude(amount=-CUT_EXTRUDE12_DEPTH, mode=Mode.SUBTRACT)

    # Sketch24 → Cut-Extrude13 (cut, through all)
    with BuildSketch(Plane(origin=(0, 3, 0), x_dir=(1, 0, 0), z_dir=(0, 1, 0))):
        with BuildLine():
            Line((31, -55), (-31, -55))
            ThreePointArc((-31, -55), (-34.535533906, -53.535533906), (-36, -50))
            Line((-36, -50), (-36, -25))
            ThreePointArc((-36, -25), (-34.535533906, -21.464466094), (-31, -20))
            Line((-31, -20), (31, -20))
            ThreePointArc((31, -20), (34.535533906, -21.464466094), (36, -25))
            Line((36, -25), (36, -50))
            ThreePointArc((36, -50), (34.535533906, -53.535533906), (31, -55))
        make_face()
    extrude(amount=-CUT_EXTRUDE13_DEPTH, mode=Mode.SUBTRACT)

    # Sketch28 → Cut-Extrude17 (cut, through all)
    with BuildSketch(Plane(origin=(0, 3, 0), x_dir=(1, 0, 0), z_dir=(0, 1, 0))):
        Rectangle(SKETCH28_W, SKETCH28_H)
    extrude(amount=-CUT_EXTRUDE17_DEPTH, mode=Mode.SUBTRACT)

    # Sketch29 → Cut-Extrude18 (cut, through all)
    with BuildSketch(Plane(origin=(0, 3, 0), x_dir=(1, 0, 0), z_dir=(0, 1, 0))):
        with Locations(Location((-36, -74.4, 0), (0, 0, 270))):
            Circle(SKETCH29_R)
        with Locations(Location((36, -74.4, 0), (0, 0, 90))):
            Circle(SKETCH29_R)
    extrude(amount=-CUT_EXTRUDE18_DEPTH, mode=Mode.SUBTRACT)


solid = part.part
